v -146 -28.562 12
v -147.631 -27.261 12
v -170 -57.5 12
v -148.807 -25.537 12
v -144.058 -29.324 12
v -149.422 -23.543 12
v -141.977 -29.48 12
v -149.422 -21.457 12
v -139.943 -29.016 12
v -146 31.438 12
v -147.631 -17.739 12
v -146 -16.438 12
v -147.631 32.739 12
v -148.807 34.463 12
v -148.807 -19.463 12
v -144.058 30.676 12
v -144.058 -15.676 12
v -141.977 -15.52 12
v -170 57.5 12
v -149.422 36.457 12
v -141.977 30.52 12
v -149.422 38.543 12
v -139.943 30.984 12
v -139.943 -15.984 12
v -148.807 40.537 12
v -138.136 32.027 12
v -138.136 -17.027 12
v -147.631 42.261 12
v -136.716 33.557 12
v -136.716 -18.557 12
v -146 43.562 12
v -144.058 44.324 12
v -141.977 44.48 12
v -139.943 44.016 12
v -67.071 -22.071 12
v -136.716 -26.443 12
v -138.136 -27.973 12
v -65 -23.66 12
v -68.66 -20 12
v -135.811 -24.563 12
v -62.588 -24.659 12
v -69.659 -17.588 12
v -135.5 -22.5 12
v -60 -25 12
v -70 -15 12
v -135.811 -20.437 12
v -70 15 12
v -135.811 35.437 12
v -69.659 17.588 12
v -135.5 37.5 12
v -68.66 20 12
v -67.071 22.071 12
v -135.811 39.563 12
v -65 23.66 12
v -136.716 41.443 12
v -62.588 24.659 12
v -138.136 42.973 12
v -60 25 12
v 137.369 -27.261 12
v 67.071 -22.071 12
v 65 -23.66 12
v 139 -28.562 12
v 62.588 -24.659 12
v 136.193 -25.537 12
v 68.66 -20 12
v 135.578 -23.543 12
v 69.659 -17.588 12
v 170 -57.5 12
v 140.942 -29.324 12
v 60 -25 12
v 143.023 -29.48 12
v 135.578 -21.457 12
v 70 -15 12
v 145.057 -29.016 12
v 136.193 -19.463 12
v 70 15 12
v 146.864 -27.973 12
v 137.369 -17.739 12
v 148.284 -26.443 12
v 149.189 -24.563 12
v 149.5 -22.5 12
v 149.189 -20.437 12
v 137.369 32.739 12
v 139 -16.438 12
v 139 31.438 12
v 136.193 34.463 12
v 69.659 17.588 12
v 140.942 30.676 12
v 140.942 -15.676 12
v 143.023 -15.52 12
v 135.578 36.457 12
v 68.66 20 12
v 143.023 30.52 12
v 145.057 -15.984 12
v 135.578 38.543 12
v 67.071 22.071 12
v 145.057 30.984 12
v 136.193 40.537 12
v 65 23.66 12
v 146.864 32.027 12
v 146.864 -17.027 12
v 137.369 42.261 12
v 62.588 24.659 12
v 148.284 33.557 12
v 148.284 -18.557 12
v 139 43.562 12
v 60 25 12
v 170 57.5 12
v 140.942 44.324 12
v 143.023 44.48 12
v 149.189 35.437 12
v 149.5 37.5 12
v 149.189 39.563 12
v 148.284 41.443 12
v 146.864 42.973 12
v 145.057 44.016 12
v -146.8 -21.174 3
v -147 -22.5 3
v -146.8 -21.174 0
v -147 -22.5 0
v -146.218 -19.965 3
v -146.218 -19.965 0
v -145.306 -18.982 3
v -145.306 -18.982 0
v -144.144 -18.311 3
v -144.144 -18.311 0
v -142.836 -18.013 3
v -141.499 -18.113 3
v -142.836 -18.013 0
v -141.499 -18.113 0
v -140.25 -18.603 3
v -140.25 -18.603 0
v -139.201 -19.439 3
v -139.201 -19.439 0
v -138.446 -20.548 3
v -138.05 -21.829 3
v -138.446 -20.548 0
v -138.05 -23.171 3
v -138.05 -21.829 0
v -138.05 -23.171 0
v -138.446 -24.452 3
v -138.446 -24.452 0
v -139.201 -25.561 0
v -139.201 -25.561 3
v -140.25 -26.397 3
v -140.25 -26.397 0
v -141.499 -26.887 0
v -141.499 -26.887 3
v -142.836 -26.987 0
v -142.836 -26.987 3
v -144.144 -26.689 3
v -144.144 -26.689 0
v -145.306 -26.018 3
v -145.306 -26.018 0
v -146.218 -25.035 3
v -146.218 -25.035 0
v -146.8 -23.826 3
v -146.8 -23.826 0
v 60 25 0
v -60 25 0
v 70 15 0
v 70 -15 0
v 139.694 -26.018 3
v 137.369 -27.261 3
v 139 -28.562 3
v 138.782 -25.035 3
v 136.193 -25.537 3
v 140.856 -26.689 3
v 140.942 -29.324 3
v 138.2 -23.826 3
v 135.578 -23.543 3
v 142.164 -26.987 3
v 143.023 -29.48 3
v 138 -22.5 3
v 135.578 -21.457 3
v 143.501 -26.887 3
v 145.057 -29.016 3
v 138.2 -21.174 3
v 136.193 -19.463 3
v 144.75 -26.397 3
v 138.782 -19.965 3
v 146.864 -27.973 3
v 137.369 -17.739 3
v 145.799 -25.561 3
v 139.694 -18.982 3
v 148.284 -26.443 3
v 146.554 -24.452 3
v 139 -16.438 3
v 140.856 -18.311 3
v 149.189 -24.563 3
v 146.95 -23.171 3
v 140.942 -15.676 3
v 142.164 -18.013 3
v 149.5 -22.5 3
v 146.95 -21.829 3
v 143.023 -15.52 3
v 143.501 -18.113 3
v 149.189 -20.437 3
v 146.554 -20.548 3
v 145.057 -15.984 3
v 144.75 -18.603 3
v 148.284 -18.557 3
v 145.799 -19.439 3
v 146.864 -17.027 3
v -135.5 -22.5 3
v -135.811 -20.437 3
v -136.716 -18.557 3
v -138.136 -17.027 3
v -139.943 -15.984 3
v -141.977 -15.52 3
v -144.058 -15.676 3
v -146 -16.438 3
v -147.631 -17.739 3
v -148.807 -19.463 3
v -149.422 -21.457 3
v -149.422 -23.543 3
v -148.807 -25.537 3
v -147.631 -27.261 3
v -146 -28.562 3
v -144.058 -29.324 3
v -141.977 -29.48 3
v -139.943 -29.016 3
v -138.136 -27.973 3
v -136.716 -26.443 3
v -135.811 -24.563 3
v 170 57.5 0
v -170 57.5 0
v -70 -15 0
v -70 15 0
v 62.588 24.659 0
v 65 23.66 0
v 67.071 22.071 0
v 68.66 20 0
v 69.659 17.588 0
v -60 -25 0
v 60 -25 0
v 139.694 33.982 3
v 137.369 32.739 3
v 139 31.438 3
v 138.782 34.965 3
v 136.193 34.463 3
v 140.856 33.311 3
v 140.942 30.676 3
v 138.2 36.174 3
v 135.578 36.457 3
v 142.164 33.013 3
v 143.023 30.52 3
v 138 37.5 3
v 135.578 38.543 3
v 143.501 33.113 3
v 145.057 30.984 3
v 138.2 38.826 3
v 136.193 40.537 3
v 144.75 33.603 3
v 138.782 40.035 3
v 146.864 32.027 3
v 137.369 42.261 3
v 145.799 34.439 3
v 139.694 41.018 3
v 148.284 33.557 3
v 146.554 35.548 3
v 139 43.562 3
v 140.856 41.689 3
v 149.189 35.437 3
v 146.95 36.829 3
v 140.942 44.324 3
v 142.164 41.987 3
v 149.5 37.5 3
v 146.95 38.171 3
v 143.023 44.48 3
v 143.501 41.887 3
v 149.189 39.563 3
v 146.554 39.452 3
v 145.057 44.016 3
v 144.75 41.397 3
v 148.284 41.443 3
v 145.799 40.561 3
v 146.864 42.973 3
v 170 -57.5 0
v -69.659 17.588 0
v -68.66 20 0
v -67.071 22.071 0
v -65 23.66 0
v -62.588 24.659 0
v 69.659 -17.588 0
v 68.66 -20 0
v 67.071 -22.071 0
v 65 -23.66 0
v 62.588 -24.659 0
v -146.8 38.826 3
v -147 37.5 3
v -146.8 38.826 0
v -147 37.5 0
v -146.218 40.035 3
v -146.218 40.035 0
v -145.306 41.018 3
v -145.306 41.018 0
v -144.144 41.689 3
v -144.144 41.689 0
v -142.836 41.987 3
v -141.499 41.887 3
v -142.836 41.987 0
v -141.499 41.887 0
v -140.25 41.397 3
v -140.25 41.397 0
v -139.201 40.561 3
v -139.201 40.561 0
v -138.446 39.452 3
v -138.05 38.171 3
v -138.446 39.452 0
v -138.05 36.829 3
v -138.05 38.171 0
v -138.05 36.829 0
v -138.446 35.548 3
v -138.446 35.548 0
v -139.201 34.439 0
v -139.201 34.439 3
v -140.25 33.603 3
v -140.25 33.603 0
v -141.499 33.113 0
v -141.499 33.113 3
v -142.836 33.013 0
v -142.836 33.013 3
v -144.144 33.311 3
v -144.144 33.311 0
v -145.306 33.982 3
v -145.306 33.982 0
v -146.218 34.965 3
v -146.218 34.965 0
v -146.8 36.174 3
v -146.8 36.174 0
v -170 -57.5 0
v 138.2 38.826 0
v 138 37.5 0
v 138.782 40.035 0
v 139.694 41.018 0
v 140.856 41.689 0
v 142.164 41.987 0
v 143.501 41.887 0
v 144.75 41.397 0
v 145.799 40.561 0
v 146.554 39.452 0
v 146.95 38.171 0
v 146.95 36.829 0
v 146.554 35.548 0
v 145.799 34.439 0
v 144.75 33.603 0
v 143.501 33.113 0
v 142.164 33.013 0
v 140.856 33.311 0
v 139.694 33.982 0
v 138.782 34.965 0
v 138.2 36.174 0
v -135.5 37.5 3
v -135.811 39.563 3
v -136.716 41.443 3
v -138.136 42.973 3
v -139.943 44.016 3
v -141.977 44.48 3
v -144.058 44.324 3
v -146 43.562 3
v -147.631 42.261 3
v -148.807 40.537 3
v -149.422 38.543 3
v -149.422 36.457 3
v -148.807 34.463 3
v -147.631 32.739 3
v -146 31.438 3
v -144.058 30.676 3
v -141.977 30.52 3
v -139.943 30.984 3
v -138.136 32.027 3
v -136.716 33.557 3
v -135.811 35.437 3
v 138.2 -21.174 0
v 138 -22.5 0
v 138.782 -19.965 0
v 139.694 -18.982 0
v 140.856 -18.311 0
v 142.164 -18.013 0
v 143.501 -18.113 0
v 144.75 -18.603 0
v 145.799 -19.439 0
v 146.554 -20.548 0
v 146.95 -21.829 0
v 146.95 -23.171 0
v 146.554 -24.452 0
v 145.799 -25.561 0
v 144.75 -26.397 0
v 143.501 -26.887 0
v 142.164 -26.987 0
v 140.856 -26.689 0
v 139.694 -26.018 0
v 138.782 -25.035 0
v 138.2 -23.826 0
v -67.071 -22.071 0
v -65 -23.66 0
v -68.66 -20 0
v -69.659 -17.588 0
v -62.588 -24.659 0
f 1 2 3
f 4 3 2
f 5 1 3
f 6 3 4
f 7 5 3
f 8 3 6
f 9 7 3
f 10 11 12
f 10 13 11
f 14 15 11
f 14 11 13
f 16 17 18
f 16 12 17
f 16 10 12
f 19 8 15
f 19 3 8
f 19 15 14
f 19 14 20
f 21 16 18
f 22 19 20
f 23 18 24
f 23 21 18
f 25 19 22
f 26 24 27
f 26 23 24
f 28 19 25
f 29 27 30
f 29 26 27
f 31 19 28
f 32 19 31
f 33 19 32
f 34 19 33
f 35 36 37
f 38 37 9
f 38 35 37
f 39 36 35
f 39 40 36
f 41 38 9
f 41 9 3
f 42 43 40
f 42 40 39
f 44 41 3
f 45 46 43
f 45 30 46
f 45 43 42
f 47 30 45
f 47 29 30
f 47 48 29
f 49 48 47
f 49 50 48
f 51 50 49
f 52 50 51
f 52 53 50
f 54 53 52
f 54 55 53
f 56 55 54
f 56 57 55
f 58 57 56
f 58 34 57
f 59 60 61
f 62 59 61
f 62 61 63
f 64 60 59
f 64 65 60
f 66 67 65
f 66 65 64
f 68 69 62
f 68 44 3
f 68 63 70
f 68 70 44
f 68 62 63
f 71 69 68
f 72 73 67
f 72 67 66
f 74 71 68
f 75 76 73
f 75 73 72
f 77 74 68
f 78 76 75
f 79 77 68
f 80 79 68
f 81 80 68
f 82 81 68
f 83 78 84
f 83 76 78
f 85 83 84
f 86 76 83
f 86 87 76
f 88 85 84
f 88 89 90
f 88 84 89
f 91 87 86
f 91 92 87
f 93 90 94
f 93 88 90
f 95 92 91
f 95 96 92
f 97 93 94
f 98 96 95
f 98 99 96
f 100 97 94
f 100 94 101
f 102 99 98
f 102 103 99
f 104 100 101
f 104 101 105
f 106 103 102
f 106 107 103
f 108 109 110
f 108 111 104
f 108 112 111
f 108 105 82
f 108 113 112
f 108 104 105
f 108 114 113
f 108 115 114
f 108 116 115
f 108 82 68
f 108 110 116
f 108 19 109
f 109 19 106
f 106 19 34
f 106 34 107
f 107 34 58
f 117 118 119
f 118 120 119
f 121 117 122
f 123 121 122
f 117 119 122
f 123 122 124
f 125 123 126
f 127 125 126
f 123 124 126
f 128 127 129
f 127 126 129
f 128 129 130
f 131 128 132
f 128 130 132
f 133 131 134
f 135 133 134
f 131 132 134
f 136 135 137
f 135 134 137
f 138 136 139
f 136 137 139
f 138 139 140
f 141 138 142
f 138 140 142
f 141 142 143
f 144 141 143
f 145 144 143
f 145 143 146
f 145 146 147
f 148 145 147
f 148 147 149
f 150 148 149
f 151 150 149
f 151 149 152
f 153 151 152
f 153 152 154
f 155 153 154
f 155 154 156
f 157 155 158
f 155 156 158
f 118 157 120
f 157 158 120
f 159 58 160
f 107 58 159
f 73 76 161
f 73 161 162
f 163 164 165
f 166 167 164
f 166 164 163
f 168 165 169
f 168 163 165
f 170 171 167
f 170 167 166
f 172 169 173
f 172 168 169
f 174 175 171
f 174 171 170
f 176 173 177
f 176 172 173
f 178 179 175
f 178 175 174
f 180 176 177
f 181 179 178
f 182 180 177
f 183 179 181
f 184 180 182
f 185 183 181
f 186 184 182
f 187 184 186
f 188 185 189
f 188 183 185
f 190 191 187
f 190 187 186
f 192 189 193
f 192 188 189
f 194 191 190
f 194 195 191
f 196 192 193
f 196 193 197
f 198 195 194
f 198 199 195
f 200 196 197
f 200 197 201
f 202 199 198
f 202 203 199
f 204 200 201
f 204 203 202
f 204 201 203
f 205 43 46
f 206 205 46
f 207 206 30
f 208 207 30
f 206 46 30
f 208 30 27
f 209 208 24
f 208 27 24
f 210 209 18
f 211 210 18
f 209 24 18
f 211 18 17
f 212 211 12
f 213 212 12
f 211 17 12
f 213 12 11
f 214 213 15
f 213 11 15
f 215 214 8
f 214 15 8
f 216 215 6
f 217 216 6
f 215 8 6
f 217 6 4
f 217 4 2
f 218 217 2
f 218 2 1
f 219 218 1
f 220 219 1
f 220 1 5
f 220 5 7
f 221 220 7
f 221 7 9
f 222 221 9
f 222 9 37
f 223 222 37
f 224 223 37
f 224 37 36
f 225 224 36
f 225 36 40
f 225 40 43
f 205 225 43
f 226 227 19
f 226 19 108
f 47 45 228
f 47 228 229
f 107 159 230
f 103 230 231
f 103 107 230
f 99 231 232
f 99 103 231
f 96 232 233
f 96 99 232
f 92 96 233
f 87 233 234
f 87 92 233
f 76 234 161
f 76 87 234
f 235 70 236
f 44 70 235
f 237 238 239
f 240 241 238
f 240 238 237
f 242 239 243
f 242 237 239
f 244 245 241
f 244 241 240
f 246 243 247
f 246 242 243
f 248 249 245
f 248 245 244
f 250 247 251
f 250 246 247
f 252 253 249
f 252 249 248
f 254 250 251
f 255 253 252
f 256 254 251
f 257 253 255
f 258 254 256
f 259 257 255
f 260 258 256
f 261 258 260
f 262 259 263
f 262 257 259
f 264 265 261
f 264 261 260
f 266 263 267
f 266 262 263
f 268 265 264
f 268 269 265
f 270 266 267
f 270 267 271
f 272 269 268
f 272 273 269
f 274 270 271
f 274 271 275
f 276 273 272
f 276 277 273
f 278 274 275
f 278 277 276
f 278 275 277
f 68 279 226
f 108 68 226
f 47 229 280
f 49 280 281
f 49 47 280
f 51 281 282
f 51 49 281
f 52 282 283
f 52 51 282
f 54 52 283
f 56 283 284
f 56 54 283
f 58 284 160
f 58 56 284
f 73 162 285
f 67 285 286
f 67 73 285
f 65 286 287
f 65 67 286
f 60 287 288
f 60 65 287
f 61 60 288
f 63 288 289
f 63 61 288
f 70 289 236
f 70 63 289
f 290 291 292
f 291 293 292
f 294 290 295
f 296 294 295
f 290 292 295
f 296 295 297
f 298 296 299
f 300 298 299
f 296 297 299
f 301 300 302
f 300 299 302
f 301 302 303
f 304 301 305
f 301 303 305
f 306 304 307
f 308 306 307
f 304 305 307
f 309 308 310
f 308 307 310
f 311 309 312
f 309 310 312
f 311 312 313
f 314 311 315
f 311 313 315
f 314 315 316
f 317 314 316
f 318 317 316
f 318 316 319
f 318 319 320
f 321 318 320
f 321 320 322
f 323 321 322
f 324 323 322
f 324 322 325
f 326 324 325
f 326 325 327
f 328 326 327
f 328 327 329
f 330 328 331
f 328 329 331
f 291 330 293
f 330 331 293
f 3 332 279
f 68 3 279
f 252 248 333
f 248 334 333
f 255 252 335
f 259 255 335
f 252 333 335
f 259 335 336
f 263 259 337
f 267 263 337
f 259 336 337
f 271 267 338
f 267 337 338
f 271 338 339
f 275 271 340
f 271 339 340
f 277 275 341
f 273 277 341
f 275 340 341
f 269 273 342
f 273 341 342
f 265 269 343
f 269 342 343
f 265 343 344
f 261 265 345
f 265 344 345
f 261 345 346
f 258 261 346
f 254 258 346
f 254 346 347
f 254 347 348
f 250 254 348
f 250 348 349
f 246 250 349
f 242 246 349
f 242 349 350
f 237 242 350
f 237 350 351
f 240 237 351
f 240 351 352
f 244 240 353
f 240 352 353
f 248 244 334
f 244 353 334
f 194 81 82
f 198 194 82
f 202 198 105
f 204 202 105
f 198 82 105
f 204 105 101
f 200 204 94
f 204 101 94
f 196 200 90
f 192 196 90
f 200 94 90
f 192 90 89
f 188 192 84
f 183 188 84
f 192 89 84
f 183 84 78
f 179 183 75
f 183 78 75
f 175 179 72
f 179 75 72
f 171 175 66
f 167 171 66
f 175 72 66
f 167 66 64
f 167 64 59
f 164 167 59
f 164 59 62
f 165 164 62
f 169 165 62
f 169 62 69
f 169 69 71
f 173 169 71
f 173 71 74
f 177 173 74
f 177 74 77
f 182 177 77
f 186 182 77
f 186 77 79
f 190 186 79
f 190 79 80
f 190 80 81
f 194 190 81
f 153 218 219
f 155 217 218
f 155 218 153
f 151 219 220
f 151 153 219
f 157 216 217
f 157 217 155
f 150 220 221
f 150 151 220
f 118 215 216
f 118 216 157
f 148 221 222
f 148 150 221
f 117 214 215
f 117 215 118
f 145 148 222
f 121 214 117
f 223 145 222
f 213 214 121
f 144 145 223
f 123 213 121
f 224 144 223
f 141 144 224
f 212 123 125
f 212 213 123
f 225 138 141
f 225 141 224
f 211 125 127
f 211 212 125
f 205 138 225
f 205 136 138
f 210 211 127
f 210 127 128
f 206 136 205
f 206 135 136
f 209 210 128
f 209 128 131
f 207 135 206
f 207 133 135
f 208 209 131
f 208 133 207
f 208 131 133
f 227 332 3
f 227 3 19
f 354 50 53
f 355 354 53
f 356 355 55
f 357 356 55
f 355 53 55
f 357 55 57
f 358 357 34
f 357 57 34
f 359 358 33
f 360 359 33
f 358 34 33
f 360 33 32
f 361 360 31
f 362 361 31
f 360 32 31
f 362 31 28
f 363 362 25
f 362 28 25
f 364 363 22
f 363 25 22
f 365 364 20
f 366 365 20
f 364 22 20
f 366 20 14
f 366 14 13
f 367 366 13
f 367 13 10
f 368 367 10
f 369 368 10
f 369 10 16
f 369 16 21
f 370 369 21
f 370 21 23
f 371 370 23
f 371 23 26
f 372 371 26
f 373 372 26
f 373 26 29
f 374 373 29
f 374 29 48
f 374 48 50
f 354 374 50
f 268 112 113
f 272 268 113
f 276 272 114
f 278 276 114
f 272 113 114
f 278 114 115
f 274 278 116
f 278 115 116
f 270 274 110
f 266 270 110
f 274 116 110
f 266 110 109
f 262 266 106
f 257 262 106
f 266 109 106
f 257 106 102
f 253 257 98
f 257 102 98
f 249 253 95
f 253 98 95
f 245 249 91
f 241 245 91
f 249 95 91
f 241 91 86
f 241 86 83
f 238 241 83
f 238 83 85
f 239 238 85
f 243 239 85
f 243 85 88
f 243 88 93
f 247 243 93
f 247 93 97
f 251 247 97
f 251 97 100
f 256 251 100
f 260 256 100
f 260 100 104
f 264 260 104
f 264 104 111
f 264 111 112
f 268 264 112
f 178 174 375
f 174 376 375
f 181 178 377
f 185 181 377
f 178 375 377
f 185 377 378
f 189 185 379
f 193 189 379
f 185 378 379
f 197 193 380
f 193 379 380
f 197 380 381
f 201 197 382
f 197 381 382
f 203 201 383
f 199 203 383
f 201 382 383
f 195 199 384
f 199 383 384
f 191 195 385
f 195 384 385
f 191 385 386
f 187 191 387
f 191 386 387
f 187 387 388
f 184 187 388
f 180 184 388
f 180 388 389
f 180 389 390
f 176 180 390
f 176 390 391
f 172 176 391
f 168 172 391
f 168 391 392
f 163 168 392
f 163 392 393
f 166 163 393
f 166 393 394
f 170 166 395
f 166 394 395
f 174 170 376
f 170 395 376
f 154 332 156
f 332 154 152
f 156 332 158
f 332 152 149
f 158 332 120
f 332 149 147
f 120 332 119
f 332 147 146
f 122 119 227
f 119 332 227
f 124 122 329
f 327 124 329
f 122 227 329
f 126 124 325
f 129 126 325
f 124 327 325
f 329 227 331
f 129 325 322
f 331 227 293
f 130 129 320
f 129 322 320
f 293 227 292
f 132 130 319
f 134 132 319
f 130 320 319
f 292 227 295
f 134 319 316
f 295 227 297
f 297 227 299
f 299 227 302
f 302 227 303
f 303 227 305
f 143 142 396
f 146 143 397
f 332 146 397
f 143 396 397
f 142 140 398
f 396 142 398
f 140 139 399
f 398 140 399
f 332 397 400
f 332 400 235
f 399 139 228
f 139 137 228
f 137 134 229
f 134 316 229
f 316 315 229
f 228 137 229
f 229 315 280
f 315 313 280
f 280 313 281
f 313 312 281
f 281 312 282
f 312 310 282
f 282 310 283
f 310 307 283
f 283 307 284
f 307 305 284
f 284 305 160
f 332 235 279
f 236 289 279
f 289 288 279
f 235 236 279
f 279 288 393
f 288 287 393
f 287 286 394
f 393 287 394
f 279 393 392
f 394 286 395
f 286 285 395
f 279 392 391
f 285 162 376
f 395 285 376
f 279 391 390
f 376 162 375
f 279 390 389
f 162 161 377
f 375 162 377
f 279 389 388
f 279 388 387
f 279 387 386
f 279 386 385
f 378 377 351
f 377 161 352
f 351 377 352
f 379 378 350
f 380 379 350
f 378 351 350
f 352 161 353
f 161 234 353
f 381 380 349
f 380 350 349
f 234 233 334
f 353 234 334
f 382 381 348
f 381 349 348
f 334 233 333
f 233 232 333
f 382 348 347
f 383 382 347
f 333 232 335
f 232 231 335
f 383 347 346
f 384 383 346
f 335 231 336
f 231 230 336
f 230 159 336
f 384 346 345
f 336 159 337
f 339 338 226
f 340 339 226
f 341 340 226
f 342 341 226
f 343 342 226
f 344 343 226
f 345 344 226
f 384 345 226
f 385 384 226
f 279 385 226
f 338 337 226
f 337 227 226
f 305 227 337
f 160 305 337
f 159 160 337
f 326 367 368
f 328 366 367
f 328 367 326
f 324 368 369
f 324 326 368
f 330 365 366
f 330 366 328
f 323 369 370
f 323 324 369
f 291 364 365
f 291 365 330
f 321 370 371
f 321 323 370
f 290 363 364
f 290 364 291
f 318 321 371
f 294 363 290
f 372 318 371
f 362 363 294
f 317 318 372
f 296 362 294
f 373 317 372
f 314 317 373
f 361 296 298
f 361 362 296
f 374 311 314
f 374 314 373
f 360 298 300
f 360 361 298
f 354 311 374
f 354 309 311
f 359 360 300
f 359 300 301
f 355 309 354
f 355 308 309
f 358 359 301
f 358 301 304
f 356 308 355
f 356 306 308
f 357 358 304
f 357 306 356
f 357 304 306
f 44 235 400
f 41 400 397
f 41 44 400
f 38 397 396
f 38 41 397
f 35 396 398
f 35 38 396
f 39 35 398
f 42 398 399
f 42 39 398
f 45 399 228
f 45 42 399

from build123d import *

# Parameters (mm, degrees)
SKETCH_1_W                = 340
SKETCH_1_H                = 115
EXTRUDE_1_DEPTH           = 12
HOLE_WIZARD_1_D           = 9
HOLE_WIZARD_1_CBORE_D     = 14
HOLE_WIZARD_1_CBORE_DEPTH = 9
CUT_EXTRUDE_1_DEPTH       = 13


with BuildPart() as part:
    # 草图1 → 凸台-拉伸1 (new body)
    with BuildSketch(Plane.XY):
        Rectangle(SKETCH_1_W, SKETCH_1_H)
    extrude(amount=EXTRUDE_1_DEPTH)

    # 打孔尺寸(%根据)内六角圆柱头螺钉的类型1 (through all)
    with Locations(Plane.XY.offset(12)):
        with Locations((-142.5, 37.5), (142.5, 37.5), (142.5, -22.5), (-142.5, -22.5)):
            CounterBoreHole(HOLE_WIZARD_1_D / 2, HOLE_WIZARD_1_CBORE_D / 2, HOLE_WIZARD_1_CBORE_DEPTH)

    # 草图4 → 切除-拉伸1 (cut, through all)
    with BuildSketch(Plane.XY.offset(12)):
        with BuildLine():
            Line((-60, 25), (60, 25))
            ThreePointArc((60, 25), (67.071067812, 22.071067812), (70, 15))
            Line((70, 15), (70, -15))
            ThreePointArc((70, -15), (67.071067812, -22.071067812), (60, -25))
            Line((60, -25), (-60, -25))
            ThreePointArc((-60, -25), (-67.071067812, -22.071067812), (-70, -15))
            Line((-70, -15), (-70, 15))
            ThreePointArc((-70, 15), (-67.071067812, 22.071067812), (-60, 25))
        make_face()
    extrude(amount=-CUT_EXTRUDE_1_DEPTH, mode=Mode.SUBTRACT)


solid = part.part
